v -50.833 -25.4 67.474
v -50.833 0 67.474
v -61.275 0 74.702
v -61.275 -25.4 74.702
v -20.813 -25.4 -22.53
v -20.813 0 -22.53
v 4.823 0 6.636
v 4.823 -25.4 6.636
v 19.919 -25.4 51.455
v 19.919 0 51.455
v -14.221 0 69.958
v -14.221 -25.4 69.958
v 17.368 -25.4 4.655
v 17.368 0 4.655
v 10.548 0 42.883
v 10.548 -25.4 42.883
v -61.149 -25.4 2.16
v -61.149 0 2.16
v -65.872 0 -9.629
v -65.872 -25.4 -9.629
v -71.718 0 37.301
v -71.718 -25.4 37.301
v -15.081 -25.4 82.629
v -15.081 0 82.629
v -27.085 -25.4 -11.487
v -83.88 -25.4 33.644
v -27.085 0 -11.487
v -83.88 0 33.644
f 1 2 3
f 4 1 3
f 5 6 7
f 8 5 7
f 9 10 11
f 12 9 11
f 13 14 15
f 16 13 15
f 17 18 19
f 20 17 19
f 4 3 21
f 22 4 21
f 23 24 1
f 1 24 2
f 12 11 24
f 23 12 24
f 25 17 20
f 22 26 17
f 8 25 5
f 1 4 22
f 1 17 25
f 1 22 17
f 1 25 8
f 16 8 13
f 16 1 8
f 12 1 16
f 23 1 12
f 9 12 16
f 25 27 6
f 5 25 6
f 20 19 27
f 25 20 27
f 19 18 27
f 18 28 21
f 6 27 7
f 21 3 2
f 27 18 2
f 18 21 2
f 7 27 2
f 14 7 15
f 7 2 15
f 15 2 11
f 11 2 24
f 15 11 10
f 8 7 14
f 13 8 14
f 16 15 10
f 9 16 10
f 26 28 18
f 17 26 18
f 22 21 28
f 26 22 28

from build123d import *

# Parameters (mm, degrees)
F1_DEPTH = 25.4


with BuildPart() as f1:
    # F0 (on Front) → F1 (new body)
    with BuildSketch(Plane.XZ):
        Polygon((17.3676, 4.654796), (10.548249, 42.882821), (4.823116, 6.63619), align=None)
        Polygon((-20.812961, -22.530177), (4.823116, 6.63619), (-27.085203, -11.487125), align=None)
        Polygon((-65.872219, -9.628965), (-27.085203, -11.487125), (-61.149093, 2.160101), align=None)
        Polygon((-83.879634, 33.643555), (-61.149093, 2.160101), (-71.71775, 37.301229), align=None)
        Polygon((-71.71775, 37.301229), (-50.832759, 67.474272), (-61.275255, 74.702294), align=None)
        Polygon((-50.832759, 67.474272), (-14.220945, 69.958314), (-15.08064, 82.629184), align=None)
        Polygon((-14.220945, 69.958314), (10.548249, 42.882821), (19.918723, 51.455114), align=None)
        Polygon((4.823116, 6.63619), (10.548249, 42.882821), (-14.220945, 69.958314), (-50.832759, 67.474272), (-71.71775, 37.301229), (-61.149093, 2.160101), (-27.085203, -11.487125), align=None)
    extrude(amount=F1_DEPTH)


solid = f1.part
